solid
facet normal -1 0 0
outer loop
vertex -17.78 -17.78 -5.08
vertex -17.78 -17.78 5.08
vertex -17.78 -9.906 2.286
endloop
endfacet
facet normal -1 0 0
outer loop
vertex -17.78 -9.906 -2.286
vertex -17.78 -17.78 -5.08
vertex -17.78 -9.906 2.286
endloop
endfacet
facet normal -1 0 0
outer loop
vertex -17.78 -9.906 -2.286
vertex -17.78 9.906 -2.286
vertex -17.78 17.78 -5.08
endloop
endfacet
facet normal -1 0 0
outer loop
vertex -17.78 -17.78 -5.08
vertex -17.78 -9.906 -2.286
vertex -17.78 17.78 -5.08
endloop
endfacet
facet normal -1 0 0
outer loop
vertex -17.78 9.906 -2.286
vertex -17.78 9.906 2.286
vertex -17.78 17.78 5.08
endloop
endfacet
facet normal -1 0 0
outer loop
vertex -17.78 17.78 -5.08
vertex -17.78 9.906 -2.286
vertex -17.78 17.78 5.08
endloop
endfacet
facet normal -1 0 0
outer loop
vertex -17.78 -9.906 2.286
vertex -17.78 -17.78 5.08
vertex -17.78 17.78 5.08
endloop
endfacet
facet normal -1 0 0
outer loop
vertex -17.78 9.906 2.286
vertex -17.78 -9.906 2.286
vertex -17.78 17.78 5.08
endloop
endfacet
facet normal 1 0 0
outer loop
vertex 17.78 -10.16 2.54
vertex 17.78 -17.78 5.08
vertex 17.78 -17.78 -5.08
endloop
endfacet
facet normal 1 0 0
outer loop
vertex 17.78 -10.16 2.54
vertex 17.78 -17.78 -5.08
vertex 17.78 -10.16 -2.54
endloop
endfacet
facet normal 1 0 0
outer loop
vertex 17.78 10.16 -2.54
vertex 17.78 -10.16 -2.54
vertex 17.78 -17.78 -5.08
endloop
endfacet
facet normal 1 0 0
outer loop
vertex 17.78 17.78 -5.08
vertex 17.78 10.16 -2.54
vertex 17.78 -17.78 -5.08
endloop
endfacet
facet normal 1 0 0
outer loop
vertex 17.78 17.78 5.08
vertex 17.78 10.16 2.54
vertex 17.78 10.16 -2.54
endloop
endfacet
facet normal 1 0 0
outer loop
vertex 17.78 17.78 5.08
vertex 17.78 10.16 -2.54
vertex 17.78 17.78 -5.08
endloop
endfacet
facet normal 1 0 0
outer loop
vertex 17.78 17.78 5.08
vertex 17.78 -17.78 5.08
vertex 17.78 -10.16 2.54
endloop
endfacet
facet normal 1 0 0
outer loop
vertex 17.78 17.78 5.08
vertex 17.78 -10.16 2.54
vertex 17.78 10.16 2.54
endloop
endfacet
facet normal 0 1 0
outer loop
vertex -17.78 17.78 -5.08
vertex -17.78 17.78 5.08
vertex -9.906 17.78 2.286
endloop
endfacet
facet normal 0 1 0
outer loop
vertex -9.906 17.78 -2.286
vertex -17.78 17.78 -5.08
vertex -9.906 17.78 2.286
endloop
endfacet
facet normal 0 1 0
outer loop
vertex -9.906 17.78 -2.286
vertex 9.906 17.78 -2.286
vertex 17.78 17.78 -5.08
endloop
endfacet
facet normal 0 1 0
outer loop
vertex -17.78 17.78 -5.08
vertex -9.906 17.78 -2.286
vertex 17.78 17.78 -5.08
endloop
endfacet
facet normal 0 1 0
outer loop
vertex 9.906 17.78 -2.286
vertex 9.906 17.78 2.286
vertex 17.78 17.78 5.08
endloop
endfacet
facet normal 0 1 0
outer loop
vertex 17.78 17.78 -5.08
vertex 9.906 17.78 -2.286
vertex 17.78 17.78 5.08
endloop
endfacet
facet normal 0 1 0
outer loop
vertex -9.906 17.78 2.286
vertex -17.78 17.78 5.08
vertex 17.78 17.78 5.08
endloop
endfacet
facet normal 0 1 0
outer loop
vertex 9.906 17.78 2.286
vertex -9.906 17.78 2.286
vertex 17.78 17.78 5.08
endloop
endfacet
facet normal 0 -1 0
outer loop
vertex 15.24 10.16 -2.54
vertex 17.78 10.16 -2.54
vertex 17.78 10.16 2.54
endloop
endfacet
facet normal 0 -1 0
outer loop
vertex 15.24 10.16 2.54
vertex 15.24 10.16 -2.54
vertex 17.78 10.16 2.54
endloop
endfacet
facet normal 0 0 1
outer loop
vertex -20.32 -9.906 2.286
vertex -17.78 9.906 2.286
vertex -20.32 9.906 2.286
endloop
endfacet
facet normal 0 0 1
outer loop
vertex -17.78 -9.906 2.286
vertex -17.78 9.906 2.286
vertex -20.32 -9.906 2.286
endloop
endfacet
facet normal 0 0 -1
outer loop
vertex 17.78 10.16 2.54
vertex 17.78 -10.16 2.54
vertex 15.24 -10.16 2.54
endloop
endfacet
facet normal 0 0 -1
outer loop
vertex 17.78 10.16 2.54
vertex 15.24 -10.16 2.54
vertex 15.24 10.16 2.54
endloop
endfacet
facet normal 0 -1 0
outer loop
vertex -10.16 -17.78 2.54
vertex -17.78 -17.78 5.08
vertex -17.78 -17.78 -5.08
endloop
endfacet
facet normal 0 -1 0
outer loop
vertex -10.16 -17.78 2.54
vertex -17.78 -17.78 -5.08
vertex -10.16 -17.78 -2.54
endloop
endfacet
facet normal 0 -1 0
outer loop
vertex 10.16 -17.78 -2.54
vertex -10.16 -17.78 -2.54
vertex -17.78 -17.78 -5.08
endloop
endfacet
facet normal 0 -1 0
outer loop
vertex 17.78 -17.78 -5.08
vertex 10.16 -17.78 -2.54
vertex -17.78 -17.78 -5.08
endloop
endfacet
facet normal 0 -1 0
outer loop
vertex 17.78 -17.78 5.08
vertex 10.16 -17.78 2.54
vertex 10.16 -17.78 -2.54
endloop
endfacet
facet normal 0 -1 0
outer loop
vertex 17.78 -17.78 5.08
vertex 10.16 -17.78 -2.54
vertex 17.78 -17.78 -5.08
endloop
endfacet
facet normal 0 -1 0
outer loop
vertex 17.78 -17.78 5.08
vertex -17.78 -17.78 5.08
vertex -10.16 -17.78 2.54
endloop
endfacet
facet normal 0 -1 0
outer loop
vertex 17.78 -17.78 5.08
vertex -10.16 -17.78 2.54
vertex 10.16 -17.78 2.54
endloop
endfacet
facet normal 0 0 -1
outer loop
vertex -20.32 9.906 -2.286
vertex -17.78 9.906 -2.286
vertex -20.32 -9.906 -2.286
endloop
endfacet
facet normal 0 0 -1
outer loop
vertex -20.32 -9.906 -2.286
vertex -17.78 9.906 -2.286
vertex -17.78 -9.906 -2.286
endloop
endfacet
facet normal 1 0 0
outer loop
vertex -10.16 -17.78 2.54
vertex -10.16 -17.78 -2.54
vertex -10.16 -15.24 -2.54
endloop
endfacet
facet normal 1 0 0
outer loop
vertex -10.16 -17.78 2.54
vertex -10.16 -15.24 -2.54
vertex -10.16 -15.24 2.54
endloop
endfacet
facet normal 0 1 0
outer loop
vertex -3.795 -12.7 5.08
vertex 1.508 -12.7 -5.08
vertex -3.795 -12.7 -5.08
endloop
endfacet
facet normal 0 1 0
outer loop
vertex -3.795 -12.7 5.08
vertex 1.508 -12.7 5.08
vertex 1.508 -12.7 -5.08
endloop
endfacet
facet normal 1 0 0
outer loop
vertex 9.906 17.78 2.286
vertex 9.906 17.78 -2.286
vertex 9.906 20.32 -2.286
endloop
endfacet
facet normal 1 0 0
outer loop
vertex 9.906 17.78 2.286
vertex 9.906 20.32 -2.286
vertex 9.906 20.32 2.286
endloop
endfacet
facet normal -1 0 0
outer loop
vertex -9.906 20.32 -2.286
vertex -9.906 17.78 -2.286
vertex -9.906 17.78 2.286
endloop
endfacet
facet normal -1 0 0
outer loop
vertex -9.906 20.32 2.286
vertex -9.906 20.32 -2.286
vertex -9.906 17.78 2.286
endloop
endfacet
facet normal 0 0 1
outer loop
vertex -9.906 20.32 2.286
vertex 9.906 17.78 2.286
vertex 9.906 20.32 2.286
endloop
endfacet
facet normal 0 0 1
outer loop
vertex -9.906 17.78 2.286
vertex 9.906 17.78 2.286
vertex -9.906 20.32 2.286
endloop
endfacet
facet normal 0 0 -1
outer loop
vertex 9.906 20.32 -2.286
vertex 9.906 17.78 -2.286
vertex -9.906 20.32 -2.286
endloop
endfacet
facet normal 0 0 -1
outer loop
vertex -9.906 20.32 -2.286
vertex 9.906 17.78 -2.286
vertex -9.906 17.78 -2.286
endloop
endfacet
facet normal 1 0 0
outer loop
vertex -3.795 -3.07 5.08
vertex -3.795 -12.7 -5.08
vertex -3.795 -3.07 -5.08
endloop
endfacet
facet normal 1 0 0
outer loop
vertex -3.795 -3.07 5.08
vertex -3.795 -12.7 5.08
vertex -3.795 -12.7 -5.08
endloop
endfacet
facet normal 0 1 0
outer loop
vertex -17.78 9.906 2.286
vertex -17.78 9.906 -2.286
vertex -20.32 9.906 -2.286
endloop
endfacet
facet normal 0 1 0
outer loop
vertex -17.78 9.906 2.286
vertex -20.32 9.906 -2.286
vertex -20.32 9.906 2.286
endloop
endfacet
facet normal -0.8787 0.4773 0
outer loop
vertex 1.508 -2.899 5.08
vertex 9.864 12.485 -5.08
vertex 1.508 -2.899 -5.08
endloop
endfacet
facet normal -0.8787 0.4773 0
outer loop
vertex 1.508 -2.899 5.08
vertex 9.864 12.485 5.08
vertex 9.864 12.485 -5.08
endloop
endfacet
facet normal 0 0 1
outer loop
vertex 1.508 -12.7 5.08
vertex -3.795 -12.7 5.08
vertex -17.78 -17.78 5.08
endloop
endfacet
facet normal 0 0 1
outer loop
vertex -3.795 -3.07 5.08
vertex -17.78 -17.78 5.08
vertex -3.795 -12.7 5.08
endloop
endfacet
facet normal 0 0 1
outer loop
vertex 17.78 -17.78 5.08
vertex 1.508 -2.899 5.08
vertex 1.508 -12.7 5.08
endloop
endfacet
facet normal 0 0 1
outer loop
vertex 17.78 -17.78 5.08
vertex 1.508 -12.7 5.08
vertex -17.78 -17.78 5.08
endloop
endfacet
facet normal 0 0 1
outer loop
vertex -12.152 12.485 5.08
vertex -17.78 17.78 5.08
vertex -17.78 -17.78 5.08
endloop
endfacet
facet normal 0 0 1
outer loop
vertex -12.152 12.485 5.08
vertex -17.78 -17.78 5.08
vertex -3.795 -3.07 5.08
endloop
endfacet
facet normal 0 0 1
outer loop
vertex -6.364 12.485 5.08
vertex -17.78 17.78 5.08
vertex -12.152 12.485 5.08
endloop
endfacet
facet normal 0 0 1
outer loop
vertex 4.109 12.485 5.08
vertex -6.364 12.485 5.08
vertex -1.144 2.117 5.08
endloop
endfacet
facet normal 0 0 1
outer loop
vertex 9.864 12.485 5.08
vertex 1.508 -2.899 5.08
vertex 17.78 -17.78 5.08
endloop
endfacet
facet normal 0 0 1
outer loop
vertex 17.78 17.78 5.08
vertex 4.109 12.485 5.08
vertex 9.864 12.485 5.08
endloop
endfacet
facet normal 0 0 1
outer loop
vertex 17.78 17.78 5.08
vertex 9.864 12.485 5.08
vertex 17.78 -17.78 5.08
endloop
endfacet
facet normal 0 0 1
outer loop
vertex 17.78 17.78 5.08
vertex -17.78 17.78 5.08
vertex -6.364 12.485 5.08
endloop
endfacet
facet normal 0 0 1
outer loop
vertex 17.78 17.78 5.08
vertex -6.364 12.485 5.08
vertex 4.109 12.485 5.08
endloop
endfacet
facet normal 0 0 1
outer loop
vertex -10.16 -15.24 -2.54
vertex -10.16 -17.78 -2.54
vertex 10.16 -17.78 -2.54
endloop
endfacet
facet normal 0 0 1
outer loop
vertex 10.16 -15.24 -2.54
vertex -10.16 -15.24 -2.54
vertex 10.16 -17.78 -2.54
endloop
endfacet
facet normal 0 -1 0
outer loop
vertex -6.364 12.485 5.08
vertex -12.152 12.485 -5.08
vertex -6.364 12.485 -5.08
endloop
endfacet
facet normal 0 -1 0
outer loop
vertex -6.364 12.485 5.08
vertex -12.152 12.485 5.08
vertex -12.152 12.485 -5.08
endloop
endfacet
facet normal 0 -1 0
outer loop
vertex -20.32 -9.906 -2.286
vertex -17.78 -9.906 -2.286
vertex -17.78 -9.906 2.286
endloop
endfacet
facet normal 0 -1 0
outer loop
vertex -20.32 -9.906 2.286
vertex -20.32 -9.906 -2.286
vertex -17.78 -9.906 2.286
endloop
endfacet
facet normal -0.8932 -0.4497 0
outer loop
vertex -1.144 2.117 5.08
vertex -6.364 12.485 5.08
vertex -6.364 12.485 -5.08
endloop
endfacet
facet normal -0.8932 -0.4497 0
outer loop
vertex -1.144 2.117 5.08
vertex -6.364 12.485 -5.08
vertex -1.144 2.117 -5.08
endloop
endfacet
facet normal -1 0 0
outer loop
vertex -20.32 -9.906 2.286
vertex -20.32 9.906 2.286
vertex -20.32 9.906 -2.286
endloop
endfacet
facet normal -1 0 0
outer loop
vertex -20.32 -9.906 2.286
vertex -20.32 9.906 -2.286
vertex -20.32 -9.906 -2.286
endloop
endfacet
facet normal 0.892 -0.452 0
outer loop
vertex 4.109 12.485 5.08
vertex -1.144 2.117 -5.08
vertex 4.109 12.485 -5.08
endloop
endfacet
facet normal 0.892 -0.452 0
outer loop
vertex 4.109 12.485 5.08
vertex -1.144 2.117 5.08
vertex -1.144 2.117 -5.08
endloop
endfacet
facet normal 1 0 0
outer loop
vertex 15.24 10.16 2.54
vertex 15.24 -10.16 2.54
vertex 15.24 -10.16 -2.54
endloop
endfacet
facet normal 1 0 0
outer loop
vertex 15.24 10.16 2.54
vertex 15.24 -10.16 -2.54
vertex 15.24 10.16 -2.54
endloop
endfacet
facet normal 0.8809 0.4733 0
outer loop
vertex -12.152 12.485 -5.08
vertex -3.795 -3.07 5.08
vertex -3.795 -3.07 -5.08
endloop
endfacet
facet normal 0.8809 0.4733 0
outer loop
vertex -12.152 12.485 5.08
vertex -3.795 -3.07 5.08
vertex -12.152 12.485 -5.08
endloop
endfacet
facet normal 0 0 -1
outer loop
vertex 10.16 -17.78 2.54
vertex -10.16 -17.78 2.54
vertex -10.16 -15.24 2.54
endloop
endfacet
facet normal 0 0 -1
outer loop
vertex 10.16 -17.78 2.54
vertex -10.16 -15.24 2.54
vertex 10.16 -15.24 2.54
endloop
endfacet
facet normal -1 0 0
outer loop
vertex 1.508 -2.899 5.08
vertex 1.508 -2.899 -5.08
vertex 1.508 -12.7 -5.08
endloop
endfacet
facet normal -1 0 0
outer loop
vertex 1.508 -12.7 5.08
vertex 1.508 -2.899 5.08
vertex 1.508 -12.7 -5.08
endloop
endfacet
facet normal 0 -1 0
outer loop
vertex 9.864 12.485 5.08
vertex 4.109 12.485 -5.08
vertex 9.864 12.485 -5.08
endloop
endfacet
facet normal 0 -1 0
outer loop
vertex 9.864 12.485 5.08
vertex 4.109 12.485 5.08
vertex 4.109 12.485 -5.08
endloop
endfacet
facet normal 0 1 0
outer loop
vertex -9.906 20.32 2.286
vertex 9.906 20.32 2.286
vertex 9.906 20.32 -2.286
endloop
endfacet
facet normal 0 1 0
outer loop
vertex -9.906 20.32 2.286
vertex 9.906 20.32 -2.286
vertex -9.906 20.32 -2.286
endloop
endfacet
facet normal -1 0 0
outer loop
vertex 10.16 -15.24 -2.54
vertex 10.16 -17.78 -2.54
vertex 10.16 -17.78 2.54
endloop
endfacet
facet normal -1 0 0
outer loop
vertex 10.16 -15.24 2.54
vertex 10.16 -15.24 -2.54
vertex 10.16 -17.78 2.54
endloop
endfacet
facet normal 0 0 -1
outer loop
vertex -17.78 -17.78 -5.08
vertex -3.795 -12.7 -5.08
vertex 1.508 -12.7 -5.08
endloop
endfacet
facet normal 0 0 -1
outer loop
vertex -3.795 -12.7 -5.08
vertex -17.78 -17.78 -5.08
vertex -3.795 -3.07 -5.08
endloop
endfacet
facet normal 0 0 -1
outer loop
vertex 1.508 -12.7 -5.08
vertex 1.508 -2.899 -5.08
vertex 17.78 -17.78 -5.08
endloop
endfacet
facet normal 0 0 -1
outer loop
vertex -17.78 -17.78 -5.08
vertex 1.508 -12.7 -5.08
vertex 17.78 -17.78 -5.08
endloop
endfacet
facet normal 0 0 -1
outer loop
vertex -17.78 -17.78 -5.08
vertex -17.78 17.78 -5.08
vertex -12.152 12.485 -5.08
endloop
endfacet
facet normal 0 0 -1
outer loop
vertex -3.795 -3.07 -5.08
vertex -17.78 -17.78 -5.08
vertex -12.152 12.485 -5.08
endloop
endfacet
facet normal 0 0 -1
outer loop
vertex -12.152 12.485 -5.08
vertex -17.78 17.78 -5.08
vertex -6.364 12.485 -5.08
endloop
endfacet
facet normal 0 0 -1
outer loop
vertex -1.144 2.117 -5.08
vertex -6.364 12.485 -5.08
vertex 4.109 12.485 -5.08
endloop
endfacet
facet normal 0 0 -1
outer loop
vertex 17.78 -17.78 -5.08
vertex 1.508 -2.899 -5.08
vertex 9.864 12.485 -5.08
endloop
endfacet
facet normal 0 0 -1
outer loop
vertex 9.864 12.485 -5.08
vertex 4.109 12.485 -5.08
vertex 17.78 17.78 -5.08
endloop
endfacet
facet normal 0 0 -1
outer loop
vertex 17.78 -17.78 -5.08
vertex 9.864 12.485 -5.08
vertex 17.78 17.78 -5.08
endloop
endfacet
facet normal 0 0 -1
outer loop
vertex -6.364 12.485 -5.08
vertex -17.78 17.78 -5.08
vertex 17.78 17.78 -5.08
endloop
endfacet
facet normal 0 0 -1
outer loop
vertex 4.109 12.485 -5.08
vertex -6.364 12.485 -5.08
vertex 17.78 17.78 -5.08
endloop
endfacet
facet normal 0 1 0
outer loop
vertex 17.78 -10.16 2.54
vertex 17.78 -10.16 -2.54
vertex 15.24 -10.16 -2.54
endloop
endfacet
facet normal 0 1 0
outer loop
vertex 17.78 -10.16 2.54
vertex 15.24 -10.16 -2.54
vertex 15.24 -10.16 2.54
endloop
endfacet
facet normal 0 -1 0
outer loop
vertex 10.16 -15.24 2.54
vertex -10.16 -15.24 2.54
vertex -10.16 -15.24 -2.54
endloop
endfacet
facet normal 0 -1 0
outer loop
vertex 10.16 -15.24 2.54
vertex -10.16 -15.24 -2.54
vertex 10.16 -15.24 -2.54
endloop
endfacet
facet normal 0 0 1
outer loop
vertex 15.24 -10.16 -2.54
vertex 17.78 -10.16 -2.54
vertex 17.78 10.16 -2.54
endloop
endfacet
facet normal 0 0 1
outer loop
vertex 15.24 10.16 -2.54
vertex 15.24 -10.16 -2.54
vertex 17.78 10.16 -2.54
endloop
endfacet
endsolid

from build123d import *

# Parameters (mm, degrees)
F0_W     = 35.56
F0_H     = 35.56
F1_DEPTH = 5.08
F2_W     = 19.812
F2_H     = 4.572
F3_DEPTH = 2.54
F4_W     = 19.812
F4_H     = 4.572
F5_DEPTH = 2.54
F6_W     = 20.32
F6_H     = 5.08
F7_DEPTH = 2.54
F8_W     = 20.32
F8_H     = 5.08
F9_DEPTH = 2.54


with BuildPart() as f1:
    # F0 (on Top) → F1 (new body, symmetric)
    with BuildSketch(Plane.XY):
        Rectangle(F0_W, F0_H)
        Polygon((-6.3637803819, 12.4850260417), (-1.1437717014, 2.1166666667), (4.1093098958, 12.4850260417), (9.8639973958, 12.4850260417), (1.5075737847, -2.8993923611), (1.5075737847, -12.7), (-3.7951171875, -12.7), (-3.7951171875, -3.0702690972), (-12.1515407986, 12.4850260417), align=None, mode=Mode.SUBTRACT)
    extrude(amount=F1_DEPTH, both=True)

    # F2 (on face) → F3 (join)
    with BuildSketch(Plane(origin=(0, 17.78, 0), x_dir=(-1, 0, 0), z_dir=(0, 1, 0))):
        Rectangle(F2_W, F2_H)
    extrude(amount=F3_DEPTH)

    # F4 (on face) → F5 (join)
    with BuildSketch(Plane(origin=(-17.78, 0, 0), x_dir=(0, -1, 0), z_dir=(-1, 0, 0))):
        Rectangle(F4_W, F4_H)
    extrude(amount=F5_DEPTH)

    # F6 (on face) → F7 (cut)
    with BuildSketch(Plane.XZ.offset(17.78)):
        Rectangle(F6_W, F6_H)
    extrude(amount=-F7_DEPTH, mode=Mode.SUBTRACT)

    # F8 (on face) → F9 (cut)
    with BuildSketch(Plane.YZ.offset(17.78)):
        Rectangle(F8_W, F8_H)
    extrude(amount=-F9_DEPTH, mode=Mode.SUBTRACT)


solid = f1.part
